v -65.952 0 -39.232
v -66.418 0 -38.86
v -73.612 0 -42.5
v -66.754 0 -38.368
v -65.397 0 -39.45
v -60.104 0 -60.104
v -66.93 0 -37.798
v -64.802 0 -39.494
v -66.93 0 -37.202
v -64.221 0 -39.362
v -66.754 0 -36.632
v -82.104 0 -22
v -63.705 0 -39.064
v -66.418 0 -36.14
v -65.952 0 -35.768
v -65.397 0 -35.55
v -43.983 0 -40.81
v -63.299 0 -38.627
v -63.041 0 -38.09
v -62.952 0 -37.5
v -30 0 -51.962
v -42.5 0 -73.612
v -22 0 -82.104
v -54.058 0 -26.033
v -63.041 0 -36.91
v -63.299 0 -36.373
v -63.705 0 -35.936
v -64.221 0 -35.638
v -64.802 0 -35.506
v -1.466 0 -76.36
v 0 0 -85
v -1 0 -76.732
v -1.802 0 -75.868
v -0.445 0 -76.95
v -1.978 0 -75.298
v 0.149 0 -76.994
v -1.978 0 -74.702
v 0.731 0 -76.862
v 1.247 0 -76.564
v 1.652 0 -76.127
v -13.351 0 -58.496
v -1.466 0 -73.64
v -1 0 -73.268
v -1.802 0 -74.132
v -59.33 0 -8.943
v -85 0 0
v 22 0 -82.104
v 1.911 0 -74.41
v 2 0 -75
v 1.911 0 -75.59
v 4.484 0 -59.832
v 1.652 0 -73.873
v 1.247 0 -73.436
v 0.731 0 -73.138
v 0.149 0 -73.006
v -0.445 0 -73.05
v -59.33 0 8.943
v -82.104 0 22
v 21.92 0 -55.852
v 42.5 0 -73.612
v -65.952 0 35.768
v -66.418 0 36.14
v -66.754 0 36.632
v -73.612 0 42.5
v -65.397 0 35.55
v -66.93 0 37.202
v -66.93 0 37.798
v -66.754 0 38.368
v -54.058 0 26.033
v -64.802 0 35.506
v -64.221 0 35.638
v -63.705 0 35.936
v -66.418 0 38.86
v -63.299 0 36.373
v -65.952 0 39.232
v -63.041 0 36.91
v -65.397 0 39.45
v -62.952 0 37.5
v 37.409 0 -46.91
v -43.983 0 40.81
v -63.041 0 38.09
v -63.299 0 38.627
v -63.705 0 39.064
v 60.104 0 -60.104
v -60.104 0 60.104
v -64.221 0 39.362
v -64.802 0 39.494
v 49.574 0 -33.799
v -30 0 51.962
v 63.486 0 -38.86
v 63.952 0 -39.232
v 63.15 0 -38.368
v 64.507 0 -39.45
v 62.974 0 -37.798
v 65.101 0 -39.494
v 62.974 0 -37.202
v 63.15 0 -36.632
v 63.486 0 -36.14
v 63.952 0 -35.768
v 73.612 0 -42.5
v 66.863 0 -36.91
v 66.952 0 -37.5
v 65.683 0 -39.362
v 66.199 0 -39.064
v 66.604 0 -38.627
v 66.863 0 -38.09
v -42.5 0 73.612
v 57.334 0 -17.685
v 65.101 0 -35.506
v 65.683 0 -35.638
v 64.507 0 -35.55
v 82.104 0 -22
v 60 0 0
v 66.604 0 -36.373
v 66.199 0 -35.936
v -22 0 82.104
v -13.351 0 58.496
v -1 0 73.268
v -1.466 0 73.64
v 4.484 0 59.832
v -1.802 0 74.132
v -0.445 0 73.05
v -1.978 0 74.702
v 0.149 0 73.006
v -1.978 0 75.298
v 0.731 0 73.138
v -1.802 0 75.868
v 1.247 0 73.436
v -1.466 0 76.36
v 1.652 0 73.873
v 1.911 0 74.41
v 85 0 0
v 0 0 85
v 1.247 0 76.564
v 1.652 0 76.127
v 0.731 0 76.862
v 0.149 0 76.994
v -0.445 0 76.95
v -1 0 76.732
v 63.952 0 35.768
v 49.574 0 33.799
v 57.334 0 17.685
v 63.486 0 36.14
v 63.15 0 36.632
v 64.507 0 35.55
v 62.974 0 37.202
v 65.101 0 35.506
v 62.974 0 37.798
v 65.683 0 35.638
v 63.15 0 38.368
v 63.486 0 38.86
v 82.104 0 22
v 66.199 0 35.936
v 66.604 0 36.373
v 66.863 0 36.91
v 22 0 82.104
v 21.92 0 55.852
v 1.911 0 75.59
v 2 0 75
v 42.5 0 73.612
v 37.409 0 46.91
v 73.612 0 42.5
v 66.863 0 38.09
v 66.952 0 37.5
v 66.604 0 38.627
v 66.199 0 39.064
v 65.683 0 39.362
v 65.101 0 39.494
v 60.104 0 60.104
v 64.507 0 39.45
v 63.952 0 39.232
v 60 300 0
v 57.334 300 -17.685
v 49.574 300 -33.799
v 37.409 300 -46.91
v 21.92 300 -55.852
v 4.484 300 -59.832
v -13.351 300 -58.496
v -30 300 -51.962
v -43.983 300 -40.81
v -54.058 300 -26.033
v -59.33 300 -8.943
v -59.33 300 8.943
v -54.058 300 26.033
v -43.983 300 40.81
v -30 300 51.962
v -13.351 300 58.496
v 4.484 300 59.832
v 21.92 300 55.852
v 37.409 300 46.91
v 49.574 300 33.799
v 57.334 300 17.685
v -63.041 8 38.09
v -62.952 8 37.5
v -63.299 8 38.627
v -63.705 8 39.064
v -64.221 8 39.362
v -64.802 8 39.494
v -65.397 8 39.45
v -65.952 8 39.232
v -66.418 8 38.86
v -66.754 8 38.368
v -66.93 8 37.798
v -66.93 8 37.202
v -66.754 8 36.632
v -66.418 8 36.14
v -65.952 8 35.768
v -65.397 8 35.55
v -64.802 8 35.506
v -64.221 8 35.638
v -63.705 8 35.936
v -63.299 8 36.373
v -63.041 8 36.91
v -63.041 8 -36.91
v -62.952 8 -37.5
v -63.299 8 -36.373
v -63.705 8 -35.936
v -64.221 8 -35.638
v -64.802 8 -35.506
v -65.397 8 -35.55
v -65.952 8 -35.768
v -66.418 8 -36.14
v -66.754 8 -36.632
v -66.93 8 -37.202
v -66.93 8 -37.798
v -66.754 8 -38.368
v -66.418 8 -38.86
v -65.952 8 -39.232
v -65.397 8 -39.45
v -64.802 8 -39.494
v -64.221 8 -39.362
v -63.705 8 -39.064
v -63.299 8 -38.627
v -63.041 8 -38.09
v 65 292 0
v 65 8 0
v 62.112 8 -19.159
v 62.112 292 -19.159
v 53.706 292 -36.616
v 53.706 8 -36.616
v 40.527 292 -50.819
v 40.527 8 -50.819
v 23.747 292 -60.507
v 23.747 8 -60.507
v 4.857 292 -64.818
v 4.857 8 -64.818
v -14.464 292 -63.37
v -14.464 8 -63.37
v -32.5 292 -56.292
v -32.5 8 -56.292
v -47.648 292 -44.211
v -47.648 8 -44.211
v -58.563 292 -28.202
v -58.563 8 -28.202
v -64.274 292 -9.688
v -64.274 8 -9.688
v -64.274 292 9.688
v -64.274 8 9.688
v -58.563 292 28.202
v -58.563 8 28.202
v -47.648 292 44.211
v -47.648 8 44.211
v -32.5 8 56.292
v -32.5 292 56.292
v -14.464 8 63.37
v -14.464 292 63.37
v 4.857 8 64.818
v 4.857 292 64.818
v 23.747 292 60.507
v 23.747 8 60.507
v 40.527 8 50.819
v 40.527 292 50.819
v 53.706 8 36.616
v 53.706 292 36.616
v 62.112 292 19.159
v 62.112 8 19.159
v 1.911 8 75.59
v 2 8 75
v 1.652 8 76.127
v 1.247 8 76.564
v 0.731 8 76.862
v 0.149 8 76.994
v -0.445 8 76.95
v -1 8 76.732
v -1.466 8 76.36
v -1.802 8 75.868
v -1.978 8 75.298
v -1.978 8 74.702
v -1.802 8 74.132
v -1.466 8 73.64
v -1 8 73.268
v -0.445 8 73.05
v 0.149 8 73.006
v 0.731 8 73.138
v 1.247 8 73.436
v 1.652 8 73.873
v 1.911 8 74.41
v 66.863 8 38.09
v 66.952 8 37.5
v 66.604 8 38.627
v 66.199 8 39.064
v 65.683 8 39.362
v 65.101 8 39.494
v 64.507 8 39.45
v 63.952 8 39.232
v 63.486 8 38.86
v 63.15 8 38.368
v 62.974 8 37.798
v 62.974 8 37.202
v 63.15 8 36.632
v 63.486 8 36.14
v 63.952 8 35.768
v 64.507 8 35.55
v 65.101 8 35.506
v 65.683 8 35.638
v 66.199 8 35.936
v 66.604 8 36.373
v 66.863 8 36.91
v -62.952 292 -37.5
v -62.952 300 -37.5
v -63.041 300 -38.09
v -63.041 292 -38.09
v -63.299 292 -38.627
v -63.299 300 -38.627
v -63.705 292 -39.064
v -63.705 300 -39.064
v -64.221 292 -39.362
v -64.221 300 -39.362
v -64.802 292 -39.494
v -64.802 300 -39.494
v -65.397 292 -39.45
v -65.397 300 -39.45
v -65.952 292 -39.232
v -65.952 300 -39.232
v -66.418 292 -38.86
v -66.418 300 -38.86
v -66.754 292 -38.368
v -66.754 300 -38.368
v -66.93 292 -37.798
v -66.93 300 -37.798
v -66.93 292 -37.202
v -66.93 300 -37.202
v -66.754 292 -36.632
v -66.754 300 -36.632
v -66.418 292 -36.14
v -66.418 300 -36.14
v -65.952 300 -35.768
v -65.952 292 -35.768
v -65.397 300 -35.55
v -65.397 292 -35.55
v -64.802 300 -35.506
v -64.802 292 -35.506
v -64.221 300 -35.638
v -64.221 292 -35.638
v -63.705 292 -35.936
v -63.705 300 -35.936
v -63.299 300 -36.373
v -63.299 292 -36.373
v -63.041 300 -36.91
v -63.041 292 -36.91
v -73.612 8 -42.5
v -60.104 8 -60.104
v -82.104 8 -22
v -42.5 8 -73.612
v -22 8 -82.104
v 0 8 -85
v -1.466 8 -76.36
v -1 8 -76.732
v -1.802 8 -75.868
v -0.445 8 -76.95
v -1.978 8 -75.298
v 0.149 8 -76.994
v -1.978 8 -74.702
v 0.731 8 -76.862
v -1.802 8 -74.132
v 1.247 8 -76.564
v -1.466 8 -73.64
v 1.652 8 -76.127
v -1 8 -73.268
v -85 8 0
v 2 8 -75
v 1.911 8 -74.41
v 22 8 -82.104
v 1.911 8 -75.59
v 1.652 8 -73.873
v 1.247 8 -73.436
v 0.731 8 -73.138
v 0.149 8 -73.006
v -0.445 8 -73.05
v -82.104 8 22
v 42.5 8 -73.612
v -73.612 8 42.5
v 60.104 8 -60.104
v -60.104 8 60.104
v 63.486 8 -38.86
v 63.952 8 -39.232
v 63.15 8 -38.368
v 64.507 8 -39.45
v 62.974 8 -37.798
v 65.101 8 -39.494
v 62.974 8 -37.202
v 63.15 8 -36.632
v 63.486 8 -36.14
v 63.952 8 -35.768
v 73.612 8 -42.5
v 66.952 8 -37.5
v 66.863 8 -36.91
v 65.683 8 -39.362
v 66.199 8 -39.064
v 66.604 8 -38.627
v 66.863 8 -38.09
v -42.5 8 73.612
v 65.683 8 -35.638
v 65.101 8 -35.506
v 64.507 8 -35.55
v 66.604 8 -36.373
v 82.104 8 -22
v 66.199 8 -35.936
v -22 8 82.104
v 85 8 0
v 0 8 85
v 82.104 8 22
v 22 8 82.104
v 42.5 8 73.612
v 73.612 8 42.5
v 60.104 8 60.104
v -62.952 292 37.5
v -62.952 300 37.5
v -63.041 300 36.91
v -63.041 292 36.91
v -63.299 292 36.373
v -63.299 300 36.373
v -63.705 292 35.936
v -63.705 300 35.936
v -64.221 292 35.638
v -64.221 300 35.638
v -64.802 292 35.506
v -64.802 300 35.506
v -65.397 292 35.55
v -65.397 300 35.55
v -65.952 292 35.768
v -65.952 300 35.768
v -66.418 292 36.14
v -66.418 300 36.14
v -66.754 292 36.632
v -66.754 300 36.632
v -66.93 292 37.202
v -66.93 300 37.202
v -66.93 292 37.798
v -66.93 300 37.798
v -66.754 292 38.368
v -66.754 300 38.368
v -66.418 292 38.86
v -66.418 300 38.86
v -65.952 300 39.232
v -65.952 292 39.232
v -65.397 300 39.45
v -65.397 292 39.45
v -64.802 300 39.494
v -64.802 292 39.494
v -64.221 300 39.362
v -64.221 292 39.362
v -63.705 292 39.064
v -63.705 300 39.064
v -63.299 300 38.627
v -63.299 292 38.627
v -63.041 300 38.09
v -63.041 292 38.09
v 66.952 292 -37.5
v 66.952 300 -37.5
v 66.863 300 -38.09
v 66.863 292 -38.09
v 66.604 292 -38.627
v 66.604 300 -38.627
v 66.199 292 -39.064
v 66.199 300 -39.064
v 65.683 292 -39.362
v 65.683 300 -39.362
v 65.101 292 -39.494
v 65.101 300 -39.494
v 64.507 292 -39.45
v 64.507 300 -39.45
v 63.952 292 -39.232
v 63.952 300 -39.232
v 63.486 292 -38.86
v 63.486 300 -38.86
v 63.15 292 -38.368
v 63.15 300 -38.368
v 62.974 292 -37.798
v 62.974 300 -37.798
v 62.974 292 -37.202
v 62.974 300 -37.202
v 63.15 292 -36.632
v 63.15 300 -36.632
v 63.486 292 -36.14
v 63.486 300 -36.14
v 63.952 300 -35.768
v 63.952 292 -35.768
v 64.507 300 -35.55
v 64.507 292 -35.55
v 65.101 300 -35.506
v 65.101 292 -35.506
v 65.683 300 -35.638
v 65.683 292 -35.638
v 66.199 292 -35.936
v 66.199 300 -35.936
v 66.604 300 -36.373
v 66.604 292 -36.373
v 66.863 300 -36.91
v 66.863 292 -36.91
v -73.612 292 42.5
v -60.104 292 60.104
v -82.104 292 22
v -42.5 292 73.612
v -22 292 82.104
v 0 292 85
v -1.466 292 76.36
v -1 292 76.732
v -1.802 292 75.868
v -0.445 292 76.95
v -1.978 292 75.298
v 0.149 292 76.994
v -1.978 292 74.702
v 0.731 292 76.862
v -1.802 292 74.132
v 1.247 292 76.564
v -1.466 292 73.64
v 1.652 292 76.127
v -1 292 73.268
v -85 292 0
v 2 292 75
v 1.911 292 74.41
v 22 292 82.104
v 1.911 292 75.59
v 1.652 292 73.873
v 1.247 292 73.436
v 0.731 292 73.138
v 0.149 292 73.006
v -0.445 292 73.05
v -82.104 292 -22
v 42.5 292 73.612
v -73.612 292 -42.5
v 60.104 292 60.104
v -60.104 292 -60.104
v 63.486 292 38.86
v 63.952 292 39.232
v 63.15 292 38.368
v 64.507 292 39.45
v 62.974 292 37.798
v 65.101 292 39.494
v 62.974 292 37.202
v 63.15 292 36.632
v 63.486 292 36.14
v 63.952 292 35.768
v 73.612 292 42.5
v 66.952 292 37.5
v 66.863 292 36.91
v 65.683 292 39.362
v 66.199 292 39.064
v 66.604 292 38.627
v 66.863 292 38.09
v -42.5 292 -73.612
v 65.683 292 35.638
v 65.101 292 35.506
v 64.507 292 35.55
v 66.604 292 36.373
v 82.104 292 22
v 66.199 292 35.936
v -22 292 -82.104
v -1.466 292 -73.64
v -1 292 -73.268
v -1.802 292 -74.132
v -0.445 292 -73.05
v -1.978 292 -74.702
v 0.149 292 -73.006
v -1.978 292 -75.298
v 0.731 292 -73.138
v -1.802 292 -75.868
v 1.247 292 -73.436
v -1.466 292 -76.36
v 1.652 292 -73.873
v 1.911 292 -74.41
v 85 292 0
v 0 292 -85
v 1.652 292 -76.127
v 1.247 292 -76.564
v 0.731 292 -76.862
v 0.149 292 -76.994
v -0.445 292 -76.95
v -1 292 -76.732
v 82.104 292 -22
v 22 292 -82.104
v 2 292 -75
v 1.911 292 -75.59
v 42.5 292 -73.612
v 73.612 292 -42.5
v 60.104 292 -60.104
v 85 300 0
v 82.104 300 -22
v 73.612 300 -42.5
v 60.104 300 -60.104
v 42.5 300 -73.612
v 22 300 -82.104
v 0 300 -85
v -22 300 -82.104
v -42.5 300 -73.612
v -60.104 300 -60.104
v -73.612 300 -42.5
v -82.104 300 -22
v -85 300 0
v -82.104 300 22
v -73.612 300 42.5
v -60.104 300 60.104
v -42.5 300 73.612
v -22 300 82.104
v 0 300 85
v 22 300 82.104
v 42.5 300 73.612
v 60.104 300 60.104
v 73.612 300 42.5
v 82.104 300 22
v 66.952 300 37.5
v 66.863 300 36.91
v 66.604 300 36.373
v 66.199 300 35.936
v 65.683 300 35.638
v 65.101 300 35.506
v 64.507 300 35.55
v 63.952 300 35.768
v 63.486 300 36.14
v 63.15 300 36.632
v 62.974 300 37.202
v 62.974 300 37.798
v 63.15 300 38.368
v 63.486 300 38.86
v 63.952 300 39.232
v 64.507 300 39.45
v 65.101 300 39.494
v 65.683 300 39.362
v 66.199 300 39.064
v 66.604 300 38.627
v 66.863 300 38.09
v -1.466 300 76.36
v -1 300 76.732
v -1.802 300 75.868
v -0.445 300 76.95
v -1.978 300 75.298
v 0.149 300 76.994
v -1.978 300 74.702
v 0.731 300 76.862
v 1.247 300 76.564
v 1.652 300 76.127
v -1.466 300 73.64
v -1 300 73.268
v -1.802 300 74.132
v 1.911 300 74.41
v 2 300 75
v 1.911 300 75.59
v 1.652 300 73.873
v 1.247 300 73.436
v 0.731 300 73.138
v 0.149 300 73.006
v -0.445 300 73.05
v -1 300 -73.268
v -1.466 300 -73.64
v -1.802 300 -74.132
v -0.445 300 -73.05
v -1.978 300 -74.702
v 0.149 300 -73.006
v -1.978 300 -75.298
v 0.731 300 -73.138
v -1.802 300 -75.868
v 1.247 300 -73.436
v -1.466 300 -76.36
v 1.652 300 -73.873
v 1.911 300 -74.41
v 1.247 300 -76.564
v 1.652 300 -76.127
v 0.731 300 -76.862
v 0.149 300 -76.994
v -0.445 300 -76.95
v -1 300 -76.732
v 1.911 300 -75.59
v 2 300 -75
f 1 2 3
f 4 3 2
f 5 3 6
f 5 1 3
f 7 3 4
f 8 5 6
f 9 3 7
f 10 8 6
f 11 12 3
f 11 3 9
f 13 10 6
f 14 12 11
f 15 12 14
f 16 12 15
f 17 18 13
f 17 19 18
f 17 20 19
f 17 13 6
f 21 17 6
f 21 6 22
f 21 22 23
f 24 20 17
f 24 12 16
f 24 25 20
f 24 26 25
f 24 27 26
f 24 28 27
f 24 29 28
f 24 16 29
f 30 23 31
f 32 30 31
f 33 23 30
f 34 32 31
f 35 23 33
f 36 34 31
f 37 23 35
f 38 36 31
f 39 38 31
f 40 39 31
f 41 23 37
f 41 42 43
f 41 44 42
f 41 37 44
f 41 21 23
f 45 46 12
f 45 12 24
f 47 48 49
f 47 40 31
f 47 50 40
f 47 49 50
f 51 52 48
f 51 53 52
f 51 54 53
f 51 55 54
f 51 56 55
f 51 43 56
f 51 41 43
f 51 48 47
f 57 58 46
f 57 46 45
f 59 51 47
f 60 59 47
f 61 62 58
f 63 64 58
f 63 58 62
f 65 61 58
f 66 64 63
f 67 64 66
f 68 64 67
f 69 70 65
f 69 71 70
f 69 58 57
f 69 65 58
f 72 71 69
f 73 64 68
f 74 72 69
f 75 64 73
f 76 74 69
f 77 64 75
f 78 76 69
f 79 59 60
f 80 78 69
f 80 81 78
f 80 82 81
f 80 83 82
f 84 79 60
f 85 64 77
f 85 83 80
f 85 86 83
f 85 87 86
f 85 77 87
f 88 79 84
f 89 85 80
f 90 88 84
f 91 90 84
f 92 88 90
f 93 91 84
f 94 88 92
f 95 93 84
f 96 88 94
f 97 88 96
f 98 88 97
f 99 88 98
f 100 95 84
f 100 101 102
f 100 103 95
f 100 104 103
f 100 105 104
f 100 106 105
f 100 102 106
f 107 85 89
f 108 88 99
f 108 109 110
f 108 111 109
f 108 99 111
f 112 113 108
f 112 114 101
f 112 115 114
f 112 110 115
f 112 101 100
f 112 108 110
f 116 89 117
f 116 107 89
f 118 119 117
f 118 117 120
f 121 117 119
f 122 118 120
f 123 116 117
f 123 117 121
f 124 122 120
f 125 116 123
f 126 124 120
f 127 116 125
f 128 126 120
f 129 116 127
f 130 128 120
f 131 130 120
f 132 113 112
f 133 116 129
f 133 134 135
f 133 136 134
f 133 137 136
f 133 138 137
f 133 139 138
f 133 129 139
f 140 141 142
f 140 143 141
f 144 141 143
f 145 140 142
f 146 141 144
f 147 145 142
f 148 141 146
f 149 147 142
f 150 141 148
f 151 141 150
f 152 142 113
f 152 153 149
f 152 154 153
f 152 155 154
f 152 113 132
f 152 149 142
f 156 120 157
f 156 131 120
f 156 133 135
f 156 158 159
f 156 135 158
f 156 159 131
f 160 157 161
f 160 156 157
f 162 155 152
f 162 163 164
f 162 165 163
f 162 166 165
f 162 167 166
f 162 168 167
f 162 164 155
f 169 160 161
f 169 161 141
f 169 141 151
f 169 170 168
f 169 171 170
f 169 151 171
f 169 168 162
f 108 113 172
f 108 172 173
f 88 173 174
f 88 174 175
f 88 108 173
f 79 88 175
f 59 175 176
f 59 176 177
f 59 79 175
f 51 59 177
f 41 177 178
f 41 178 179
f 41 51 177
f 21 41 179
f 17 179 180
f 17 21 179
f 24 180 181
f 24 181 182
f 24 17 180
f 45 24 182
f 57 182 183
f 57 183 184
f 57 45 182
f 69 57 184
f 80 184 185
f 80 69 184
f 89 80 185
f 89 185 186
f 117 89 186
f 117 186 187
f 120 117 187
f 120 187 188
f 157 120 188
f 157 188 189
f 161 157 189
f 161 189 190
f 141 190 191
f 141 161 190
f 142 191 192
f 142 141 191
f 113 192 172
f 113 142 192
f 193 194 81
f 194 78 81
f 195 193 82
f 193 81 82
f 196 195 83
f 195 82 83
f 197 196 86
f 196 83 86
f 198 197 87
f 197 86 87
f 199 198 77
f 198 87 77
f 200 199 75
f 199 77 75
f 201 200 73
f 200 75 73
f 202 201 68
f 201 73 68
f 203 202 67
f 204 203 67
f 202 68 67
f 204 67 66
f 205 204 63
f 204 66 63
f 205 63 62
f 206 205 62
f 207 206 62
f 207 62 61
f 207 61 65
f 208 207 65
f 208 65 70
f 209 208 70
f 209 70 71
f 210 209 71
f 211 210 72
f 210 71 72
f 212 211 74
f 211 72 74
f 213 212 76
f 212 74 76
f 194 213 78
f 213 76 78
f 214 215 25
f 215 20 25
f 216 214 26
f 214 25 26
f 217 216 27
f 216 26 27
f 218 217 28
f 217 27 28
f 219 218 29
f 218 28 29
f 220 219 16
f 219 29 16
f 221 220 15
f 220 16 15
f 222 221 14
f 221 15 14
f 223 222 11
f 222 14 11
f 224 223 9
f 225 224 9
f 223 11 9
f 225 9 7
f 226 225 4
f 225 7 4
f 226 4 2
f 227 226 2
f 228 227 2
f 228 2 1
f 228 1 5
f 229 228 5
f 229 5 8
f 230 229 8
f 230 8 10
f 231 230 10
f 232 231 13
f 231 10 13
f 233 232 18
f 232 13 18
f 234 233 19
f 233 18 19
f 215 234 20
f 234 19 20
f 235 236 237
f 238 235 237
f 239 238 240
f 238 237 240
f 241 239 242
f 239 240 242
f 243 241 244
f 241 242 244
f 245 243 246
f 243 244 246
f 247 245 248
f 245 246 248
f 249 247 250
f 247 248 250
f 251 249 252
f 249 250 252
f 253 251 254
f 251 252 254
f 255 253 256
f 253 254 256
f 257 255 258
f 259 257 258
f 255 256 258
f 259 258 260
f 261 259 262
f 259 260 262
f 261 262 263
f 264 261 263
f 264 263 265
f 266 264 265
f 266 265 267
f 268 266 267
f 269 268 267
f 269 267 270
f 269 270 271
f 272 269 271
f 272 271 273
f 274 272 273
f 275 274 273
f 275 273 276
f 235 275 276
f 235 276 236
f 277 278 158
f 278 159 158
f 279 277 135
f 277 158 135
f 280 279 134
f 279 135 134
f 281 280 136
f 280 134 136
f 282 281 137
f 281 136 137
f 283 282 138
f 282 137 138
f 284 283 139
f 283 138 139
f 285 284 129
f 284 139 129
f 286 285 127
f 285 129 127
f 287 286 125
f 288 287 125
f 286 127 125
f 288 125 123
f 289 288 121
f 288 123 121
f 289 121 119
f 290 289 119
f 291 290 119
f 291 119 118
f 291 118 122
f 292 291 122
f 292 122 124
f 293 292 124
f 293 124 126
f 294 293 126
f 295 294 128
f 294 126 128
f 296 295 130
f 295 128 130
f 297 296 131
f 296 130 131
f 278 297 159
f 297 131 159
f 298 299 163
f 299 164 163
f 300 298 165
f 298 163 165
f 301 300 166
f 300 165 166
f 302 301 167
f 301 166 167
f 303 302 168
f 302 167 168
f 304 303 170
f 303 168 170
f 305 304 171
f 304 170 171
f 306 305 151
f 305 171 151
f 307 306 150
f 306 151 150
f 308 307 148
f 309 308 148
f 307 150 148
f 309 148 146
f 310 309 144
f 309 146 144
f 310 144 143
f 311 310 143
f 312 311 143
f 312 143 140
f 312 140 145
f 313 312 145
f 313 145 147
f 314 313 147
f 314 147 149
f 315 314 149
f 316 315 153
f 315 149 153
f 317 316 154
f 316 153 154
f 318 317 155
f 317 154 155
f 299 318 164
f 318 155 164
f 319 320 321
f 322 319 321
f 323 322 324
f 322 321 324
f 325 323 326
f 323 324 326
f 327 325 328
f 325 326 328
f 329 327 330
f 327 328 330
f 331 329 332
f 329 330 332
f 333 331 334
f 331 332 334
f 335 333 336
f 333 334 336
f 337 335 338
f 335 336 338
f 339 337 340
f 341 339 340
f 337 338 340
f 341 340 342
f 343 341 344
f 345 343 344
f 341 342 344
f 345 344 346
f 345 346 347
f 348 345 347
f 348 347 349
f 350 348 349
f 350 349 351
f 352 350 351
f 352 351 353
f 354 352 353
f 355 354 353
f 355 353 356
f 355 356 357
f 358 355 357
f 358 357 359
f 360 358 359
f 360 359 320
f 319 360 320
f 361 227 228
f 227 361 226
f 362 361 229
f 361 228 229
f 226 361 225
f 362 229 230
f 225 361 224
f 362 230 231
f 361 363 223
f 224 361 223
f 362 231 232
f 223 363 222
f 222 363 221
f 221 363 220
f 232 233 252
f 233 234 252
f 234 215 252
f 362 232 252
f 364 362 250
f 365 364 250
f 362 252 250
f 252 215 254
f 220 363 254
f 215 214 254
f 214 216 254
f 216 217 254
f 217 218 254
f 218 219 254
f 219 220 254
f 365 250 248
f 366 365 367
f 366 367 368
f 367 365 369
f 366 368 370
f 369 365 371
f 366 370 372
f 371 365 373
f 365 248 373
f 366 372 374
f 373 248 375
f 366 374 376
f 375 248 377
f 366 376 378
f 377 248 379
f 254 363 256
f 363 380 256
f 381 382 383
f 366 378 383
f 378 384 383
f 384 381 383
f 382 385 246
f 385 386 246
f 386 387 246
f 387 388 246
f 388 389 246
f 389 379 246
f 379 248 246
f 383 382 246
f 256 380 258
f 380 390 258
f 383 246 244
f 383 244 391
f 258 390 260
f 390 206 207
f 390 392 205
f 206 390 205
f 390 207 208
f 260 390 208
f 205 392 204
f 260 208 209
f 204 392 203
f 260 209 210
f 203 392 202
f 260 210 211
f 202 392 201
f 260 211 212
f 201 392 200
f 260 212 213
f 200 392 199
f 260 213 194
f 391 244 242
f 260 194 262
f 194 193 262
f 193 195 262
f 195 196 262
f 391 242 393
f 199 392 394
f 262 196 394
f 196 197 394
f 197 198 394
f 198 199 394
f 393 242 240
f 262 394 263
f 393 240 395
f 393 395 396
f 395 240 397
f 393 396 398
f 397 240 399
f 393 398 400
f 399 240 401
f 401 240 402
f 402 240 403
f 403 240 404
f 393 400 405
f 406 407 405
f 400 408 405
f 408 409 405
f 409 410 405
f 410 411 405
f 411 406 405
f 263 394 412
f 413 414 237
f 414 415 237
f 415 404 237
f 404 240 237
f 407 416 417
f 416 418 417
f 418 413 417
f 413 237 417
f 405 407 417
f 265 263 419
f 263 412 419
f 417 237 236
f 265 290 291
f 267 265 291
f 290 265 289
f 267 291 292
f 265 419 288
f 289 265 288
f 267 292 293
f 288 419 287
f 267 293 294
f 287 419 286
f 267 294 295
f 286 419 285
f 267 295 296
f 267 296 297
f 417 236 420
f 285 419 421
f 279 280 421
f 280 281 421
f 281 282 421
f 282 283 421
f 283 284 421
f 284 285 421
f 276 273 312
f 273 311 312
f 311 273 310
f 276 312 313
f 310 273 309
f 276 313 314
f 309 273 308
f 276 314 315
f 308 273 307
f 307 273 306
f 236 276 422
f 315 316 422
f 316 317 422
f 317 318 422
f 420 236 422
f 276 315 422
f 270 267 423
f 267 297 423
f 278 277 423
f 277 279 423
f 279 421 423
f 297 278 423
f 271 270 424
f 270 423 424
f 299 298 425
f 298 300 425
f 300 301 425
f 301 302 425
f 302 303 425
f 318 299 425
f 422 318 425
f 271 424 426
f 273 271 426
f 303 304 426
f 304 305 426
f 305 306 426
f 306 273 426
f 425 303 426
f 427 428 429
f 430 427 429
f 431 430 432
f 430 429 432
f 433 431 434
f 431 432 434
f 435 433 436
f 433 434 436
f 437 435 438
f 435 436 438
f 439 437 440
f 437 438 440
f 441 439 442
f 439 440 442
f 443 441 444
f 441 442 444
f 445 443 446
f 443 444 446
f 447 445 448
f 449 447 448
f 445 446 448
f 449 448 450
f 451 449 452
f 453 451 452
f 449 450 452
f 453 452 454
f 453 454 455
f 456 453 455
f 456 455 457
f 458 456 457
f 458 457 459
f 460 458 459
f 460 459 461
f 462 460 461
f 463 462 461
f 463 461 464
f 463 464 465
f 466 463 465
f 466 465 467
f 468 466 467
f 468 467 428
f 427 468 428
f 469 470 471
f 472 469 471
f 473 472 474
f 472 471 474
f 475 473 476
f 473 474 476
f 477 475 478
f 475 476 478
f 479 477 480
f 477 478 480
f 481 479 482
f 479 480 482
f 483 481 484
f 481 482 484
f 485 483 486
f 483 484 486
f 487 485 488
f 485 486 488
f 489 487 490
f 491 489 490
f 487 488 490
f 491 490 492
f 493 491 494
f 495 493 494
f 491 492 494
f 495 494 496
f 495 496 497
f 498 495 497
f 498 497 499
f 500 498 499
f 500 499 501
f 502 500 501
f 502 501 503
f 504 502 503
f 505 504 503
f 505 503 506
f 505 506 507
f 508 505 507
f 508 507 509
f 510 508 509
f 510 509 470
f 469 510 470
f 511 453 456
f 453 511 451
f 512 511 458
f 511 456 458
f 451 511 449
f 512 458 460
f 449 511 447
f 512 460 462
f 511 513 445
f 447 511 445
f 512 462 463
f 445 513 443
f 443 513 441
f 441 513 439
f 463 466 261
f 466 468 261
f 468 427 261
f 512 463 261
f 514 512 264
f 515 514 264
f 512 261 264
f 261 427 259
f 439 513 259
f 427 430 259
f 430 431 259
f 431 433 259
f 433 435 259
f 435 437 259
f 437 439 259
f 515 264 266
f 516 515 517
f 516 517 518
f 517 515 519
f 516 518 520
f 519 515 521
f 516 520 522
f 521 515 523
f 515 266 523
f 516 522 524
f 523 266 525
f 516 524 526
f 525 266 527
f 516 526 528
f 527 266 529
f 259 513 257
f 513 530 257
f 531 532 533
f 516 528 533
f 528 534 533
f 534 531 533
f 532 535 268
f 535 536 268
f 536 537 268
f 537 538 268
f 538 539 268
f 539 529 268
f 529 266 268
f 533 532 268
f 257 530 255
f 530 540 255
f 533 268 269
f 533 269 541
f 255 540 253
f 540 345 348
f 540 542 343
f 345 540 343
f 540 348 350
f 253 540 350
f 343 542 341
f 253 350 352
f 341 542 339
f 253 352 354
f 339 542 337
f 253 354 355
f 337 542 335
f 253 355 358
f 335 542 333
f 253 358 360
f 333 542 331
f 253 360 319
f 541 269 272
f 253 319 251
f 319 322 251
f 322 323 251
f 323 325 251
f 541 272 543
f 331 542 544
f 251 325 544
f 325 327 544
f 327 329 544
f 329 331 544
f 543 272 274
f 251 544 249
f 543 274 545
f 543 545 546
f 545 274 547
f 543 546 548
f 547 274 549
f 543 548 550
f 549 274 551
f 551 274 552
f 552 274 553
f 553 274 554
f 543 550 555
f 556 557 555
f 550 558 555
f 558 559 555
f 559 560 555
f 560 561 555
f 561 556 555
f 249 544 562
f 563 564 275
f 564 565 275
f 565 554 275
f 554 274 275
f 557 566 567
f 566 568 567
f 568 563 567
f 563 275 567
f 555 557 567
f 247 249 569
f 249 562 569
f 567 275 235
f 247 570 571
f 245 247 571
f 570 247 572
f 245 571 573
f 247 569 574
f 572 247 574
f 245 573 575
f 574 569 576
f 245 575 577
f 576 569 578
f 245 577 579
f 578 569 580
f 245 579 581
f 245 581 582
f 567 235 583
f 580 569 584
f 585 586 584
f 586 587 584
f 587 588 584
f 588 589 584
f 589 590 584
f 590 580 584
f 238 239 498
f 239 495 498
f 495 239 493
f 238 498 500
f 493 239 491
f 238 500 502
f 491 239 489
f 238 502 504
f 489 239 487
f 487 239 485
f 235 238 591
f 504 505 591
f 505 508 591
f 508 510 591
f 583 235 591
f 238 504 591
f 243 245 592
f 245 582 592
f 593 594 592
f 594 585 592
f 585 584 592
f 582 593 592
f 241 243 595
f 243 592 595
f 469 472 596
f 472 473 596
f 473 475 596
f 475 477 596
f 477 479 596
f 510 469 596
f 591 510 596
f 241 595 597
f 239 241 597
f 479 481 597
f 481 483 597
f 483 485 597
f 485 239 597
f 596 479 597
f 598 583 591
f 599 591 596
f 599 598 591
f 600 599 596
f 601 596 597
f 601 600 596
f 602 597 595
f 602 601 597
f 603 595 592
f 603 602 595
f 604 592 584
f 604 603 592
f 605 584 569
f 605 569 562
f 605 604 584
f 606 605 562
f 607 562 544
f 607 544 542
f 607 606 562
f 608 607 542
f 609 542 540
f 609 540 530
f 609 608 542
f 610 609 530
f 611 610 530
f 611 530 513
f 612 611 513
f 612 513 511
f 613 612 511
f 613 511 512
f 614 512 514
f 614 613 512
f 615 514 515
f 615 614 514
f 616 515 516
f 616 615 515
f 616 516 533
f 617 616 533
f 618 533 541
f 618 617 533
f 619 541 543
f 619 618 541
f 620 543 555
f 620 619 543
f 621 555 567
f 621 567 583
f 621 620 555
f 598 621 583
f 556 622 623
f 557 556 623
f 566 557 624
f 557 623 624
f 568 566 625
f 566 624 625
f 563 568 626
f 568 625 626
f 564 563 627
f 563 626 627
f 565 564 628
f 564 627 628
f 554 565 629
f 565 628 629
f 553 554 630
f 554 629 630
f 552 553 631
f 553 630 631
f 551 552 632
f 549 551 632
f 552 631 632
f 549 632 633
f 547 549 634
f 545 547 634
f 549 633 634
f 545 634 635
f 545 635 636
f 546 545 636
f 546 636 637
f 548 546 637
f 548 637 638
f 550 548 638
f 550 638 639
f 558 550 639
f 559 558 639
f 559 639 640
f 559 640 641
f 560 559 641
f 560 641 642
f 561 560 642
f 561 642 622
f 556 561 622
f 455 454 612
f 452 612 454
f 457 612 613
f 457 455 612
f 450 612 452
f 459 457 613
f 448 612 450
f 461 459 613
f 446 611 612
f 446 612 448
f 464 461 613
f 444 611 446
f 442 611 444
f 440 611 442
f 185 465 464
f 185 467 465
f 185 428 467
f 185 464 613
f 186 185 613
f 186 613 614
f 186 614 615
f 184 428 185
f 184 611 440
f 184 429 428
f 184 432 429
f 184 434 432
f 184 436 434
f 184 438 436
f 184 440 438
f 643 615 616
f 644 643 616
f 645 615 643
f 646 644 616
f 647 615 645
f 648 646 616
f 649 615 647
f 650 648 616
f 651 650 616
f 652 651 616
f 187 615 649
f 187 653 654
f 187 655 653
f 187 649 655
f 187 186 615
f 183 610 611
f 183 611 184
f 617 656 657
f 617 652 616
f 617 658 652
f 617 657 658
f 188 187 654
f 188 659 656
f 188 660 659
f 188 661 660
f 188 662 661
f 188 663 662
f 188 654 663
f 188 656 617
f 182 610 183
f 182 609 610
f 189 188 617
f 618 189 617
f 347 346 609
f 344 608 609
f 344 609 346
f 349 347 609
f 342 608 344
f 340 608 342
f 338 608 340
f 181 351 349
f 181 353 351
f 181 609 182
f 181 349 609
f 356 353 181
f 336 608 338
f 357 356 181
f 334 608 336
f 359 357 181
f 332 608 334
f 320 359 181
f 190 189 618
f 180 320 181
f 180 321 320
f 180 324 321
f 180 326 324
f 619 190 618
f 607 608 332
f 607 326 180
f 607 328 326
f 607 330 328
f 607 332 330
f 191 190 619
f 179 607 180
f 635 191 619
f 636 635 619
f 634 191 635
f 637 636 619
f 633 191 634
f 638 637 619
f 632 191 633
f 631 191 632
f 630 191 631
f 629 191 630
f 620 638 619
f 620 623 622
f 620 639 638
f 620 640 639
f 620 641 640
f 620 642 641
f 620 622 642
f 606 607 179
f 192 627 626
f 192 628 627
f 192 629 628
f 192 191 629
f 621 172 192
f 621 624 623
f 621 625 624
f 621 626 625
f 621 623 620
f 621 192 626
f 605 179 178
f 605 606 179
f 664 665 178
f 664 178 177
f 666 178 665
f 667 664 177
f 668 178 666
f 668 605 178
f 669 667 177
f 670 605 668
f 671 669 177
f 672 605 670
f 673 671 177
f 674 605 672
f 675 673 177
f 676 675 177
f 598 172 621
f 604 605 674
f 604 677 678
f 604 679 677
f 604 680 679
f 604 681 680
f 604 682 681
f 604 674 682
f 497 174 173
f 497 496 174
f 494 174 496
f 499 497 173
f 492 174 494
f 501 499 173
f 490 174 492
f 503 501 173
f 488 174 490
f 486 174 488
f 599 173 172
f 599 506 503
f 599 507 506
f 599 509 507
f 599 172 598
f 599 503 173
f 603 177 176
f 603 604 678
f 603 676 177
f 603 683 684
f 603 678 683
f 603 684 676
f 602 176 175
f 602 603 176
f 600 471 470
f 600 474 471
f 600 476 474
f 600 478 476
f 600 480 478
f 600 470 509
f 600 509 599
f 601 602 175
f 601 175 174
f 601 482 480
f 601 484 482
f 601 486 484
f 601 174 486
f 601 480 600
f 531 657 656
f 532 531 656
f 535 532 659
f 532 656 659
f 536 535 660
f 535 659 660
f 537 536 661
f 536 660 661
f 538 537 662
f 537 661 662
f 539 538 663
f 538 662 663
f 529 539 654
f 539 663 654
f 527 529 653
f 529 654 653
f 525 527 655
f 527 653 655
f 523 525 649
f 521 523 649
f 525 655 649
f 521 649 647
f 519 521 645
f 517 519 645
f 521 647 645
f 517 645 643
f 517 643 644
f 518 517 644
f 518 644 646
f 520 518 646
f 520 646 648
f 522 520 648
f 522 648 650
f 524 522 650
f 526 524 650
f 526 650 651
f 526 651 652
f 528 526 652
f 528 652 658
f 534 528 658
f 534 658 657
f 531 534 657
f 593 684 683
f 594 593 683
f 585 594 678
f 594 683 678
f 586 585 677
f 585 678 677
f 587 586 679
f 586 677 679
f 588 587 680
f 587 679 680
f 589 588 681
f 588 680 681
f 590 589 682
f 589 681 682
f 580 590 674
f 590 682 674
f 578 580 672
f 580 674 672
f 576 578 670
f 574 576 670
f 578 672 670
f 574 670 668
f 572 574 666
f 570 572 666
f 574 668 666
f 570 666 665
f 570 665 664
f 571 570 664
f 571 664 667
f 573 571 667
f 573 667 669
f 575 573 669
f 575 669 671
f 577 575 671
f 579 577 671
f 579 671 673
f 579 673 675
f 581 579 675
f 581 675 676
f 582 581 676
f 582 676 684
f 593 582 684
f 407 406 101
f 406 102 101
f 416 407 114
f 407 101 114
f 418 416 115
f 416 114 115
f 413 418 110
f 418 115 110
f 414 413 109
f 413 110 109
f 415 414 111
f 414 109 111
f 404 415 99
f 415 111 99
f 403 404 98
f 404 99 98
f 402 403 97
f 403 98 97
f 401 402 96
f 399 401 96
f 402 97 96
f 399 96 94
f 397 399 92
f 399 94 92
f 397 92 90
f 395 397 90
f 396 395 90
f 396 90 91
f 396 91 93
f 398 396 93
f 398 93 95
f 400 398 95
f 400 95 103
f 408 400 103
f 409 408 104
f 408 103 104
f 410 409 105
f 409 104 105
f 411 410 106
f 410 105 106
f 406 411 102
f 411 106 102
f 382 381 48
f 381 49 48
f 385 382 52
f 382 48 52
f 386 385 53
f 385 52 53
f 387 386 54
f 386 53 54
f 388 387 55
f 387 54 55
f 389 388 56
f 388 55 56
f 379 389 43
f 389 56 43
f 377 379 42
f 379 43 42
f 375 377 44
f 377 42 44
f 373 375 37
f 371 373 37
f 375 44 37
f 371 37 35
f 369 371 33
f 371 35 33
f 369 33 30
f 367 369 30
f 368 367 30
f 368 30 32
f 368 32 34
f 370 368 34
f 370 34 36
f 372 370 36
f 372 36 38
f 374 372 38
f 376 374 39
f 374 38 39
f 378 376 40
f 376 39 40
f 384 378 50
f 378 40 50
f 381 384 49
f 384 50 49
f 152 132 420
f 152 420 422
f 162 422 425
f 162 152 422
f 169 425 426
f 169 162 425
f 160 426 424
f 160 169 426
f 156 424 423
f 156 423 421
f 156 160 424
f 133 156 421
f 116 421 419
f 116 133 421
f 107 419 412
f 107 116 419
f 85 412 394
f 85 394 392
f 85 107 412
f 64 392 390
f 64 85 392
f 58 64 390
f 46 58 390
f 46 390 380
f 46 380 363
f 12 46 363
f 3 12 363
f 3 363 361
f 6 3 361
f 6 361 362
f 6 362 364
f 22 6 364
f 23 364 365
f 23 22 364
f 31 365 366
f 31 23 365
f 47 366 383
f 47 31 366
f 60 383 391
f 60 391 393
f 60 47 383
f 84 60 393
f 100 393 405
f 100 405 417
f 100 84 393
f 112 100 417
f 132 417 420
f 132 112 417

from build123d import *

# Parameters (mm, degrees)
SKETCH_1_R               = 65
SKETCH_1_R_2             = 60
EXTRUDE_1_DEPTH          = 300
SKETCH_2_R               = 85
SKETCH_2_R_2             = 65
EXTRUDE_1_2_DEPTH        = 8
SKETCH_3_R               = 2
CUT_EXTRUDE_1_DEPTH      = 301
SKETCH_4_R               = 85
SKETCH_4_R_2             = 65
EXTRUDE_2_DEPTH          = 8
SKETCH_5_R               = 2
CUT_EXTRUDE_2_DEPTH      = 1
CUT_EXTRUDE_2_DEPTH_BACK = 301


with BuildPart() as part:
    # 草图1 → Extrude 1 (new body)
    with BuildSketch(Plane(origin=(0, 0, 0), x_dir=(1, 0, 0), z_dir=(0, 1, 0))):
        Circle(SKETCH_1_R)
        Circle(SKETCH_1_R_2, mode=Mode.SUBTRACT)
    extrude(amount=EXTRUDE_1_DEPTH)

    # 草图2 → Extrude 1 2 (add)
    with BuildSketch(Plane(origin=(0, 300, 0), x_dir=(1, 0, 0), z_dir=(0, 1, 0))):
        Circle(SKETCH_2_R)
        Circle(SKETCH_2_R_2, mode=Mode.SUBTRACT)
    extrude(amount=-EXTRUDE_1_2_DEPTH)

    # 草图3 → 切除-拉伸1 (cut, through all)
    with BuildSketch(Plane(origin=(0, 300, 0), x_dir=(1, 0, 0), z_dir=(0, 1, 0))):
        with Locations((0, 75)):
            Circle(SKETCH_3_R)
        with Locations((64.951905284, 37.5)):
            Circle(SKETCH_3_R)
        with Locations((64.951905284, -37.5)):
            Circle(SKETCH_3_R)
        with Locations((0, -75)):
            Circle(SKETCH_3_R)
        with Locations((-64.951905284, -37.5)):
            Circle(SKETCH_3_R)
        with Locations((-64.951905284, 37.5)):
            Circle(SKETCH_3_R)
    extrude(amount=-CUT_EXTRUDE_1_DEPTH, mode=Mode.SUBTRACT)

    # 草图4 → 凸台-拉伸2 (add)
    with BuildSketch(Plane.XZ):
        Circle(SKETCH_4_R)
        Circle(SKETCH_4_R_2, mode=Mode.SUBTRACT)
    extrude(amount=-EXTRUDE_2_DEPTH)

    # 草图5 → 切除-拉伸2 (cut, two sides)
    with BuildSketch(Plane.XZ) as cut_extrude_2_sk:
        with Locations((0, 75)):
            Circle(SKETCH_5_R)
        with Locations((64.951905284, 37.5)):
            Circle(SKETCH_5_R)
        with Locations((64.951905284, -37.5)):
            Circle(SKETCH_5_R)
        with Locations((0, -75)):
            Circle(SKETCH_5_R)
        with Locations((-64.951905284, -37.5)):
            Circle(SKETCH_5_R)
        with Locations((-64.951905284, 37.5)):
            Circle(SKETCH_5_R)
    extrude(amount=CUT_EXTRUDE_2_DEPTH, mode=Mode.SUBTRACT)
    extrude(cut_extrude_2_sk.sketch, amount=-CUT_EXTRUDE_2_DEPTH_BACK, mode=Mode.SUBTRACT)


solid = part.part
